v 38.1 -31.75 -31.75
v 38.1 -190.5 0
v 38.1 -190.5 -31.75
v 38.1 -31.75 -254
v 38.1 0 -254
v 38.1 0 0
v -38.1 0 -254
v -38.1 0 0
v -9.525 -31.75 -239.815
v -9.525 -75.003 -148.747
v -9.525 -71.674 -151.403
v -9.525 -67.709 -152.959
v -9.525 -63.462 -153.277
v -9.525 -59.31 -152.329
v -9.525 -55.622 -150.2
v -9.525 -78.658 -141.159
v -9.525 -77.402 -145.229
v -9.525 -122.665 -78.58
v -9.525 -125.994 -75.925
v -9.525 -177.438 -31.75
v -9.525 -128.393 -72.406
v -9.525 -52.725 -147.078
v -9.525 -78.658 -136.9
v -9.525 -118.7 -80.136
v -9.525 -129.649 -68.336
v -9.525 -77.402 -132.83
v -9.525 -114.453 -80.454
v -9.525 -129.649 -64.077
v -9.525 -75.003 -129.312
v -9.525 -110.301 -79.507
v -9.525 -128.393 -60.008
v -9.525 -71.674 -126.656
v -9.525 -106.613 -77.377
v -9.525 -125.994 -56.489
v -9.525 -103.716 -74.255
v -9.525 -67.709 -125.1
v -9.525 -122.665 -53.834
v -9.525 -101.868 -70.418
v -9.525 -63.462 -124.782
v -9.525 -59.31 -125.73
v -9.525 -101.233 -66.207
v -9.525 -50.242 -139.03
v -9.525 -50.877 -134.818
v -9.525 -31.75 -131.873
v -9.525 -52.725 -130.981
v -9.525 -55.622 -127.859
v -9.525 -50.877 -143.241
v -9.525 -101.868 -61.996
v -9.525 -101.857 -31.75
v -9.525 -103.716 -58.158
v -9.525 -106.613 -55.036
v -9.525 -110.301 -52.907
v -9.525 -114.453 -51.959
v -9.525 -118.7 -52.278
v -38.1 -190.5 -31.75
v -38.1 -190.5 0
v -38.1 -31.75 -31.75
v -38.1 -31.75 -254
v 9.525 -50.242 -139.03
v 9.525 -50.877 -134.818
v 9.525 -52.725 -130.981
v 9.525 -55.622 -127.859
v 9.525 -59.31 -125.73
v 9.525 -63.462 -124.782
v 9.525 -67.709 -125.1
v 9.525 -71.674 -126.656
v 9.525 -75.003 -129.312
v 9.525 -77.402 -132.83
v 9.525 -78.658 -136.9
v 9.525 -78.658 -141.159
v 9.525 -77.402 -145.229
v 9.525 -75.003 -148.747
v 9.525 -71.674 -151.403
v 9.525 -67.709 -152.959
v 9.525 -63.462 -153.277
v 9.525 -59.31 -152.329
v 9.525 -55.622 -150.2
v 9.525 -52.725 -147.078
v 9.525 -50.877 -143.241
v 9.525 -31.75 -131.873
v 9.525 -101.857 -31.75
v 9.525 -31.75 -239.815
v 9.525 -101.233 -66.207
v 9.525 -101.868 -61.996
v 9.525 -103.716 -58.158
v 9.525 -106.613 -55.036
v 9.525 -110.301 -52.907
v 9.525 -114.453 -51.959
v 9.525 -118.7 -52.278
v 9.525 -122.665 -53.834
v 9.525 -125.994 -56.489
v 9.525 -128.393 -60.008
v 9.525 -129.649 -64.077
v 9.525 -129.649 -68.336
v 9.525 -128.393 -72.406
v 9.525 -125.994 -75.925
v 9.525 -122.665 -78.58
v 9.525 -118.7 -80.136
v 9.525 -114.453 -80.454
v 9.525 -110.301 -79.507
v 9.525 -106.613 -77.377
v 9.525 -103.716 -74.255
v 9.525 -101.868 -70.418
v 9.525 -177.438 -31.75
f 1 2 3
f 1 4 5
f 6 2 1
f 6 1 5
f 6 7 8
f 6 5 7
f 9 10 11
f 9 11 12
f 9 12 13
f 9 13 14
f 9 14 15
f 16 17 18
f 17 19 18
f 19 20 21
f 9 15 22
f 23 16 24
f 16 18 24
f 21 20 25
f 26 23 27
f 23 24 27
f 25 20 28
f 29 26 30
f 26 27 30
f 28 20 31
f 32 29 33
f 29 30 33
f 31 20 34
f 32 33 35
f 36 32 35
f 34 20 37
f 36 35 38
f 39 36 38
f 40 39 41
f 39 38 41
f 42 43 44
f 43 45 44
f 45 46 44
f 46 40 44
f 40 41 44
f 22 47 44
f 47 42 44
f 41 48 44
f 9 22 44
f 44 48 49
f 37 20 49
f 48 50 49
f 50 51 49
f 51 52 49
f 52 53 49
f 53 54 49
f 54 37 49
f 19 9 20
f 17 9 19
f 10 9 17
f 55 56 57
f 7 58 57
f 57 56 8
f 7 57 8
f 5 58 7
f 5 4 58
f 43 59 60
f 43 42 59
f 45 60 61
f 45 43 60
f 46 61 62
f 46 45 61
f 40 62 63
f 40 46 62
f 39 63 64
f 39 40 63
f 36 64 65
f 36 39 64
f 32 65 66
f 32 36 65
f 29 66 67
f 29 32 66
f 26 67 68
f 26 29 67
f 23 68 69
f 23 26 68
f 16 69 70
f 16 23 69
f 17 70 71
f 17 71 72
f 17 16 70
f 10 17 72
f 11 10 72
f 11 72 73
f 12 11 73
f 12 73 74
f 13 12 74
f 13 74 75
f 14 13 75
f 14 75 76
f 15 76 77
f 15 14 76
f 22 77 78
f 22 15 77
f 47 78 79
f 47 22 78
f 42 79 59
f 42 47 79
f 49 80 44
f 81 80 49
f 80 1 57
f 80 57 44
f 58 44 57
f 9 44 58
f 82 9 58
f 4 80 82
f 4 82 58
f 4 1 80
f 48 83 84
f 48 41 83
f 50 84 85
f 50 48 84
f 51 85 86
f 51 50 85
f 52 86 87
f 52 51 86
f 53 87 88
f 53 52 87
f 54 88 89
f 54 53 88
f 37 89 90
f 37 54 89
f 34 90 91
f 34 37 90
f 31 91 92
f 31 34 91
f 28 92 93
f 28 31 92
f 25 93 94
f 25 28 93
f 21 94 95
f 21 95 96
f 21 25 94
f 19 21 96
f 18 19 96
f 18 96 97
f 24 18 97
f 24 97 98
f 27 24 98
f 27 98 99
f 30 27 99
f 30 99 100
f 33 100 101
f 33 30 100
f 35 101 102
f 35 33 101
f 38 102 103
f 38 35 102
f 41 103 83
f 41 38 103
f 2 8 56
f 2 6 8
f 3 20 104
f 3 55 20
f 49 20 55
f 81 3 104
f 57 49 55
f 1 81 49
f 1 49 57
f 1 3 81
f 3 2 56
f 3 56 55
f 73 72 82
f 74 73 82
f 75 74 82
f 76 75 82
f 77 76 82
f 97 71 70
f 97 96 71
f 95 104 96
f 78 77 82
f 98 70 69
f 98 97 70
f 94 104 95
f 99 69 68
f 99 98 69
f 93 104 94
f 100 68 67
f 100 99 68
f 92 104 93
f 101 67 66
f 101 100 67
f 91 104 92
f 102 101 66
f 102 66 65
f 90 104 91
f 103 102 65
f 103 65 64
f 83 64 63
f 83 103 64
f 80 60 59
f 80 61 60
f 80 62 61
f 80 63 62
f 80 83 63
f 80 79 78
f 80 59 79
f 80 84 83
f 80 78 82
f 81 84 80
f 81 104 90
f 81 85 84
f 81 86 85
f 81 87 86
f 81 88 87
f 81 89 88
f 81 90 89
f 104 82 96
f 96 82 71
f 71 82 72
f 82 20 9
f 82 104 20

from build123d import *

# Parameters (mm, degrees)
F1_DEPTH = 38.1
F2_DEPTH = 38.1
F0_R     = 14.2875
F3_DEPTH = 9.525


with BuildPart() as f1:
    # F0 (on Right) → F1 (new body, symmetric)
    with BuildSketch(Plane.YZ):
        Polygon((0, -254), (0, 0), (-31.75, 0), (-31.75, -31.75), (-31.75, -131.87347), (-31.75, -239.814619), (-31.75, -254), align=None)
    extrude(amount=F1_DEPTH, both=True)

    # F0 (on Right) → F2 (join, symmetric)
    with BuildSketch(Plane.YZ):
        Polygon((-31.75, -31.75), (-31.75, 0), (-190.5, 0), (-190.5, -31.75), (-177.438415, -31.75), (-101.857208, -31.75), align=None)
    extrude(amount=F2_DEPTH, both=True)

    # F0 (on Right) → F3 (join, symmetric)
    with BuildSketch(Plane.YZ):
        Polygon((-31.75, -239.814619), (-31.75, -131.87347), (-101.857208, -31.75), (-177.438415, -31.75), align=None)
        with Locations((-64.529893, -139.029505)):
            Circle(F0_R, mode=Mode.SUBTRACT)
        with Locations((-115.520839, -66.206888)):
            Circle(F0_R, mode=Mode.SUBTRACT)
    extrude(amount=F3_DEPTH, both=True)


solid = f1.part
